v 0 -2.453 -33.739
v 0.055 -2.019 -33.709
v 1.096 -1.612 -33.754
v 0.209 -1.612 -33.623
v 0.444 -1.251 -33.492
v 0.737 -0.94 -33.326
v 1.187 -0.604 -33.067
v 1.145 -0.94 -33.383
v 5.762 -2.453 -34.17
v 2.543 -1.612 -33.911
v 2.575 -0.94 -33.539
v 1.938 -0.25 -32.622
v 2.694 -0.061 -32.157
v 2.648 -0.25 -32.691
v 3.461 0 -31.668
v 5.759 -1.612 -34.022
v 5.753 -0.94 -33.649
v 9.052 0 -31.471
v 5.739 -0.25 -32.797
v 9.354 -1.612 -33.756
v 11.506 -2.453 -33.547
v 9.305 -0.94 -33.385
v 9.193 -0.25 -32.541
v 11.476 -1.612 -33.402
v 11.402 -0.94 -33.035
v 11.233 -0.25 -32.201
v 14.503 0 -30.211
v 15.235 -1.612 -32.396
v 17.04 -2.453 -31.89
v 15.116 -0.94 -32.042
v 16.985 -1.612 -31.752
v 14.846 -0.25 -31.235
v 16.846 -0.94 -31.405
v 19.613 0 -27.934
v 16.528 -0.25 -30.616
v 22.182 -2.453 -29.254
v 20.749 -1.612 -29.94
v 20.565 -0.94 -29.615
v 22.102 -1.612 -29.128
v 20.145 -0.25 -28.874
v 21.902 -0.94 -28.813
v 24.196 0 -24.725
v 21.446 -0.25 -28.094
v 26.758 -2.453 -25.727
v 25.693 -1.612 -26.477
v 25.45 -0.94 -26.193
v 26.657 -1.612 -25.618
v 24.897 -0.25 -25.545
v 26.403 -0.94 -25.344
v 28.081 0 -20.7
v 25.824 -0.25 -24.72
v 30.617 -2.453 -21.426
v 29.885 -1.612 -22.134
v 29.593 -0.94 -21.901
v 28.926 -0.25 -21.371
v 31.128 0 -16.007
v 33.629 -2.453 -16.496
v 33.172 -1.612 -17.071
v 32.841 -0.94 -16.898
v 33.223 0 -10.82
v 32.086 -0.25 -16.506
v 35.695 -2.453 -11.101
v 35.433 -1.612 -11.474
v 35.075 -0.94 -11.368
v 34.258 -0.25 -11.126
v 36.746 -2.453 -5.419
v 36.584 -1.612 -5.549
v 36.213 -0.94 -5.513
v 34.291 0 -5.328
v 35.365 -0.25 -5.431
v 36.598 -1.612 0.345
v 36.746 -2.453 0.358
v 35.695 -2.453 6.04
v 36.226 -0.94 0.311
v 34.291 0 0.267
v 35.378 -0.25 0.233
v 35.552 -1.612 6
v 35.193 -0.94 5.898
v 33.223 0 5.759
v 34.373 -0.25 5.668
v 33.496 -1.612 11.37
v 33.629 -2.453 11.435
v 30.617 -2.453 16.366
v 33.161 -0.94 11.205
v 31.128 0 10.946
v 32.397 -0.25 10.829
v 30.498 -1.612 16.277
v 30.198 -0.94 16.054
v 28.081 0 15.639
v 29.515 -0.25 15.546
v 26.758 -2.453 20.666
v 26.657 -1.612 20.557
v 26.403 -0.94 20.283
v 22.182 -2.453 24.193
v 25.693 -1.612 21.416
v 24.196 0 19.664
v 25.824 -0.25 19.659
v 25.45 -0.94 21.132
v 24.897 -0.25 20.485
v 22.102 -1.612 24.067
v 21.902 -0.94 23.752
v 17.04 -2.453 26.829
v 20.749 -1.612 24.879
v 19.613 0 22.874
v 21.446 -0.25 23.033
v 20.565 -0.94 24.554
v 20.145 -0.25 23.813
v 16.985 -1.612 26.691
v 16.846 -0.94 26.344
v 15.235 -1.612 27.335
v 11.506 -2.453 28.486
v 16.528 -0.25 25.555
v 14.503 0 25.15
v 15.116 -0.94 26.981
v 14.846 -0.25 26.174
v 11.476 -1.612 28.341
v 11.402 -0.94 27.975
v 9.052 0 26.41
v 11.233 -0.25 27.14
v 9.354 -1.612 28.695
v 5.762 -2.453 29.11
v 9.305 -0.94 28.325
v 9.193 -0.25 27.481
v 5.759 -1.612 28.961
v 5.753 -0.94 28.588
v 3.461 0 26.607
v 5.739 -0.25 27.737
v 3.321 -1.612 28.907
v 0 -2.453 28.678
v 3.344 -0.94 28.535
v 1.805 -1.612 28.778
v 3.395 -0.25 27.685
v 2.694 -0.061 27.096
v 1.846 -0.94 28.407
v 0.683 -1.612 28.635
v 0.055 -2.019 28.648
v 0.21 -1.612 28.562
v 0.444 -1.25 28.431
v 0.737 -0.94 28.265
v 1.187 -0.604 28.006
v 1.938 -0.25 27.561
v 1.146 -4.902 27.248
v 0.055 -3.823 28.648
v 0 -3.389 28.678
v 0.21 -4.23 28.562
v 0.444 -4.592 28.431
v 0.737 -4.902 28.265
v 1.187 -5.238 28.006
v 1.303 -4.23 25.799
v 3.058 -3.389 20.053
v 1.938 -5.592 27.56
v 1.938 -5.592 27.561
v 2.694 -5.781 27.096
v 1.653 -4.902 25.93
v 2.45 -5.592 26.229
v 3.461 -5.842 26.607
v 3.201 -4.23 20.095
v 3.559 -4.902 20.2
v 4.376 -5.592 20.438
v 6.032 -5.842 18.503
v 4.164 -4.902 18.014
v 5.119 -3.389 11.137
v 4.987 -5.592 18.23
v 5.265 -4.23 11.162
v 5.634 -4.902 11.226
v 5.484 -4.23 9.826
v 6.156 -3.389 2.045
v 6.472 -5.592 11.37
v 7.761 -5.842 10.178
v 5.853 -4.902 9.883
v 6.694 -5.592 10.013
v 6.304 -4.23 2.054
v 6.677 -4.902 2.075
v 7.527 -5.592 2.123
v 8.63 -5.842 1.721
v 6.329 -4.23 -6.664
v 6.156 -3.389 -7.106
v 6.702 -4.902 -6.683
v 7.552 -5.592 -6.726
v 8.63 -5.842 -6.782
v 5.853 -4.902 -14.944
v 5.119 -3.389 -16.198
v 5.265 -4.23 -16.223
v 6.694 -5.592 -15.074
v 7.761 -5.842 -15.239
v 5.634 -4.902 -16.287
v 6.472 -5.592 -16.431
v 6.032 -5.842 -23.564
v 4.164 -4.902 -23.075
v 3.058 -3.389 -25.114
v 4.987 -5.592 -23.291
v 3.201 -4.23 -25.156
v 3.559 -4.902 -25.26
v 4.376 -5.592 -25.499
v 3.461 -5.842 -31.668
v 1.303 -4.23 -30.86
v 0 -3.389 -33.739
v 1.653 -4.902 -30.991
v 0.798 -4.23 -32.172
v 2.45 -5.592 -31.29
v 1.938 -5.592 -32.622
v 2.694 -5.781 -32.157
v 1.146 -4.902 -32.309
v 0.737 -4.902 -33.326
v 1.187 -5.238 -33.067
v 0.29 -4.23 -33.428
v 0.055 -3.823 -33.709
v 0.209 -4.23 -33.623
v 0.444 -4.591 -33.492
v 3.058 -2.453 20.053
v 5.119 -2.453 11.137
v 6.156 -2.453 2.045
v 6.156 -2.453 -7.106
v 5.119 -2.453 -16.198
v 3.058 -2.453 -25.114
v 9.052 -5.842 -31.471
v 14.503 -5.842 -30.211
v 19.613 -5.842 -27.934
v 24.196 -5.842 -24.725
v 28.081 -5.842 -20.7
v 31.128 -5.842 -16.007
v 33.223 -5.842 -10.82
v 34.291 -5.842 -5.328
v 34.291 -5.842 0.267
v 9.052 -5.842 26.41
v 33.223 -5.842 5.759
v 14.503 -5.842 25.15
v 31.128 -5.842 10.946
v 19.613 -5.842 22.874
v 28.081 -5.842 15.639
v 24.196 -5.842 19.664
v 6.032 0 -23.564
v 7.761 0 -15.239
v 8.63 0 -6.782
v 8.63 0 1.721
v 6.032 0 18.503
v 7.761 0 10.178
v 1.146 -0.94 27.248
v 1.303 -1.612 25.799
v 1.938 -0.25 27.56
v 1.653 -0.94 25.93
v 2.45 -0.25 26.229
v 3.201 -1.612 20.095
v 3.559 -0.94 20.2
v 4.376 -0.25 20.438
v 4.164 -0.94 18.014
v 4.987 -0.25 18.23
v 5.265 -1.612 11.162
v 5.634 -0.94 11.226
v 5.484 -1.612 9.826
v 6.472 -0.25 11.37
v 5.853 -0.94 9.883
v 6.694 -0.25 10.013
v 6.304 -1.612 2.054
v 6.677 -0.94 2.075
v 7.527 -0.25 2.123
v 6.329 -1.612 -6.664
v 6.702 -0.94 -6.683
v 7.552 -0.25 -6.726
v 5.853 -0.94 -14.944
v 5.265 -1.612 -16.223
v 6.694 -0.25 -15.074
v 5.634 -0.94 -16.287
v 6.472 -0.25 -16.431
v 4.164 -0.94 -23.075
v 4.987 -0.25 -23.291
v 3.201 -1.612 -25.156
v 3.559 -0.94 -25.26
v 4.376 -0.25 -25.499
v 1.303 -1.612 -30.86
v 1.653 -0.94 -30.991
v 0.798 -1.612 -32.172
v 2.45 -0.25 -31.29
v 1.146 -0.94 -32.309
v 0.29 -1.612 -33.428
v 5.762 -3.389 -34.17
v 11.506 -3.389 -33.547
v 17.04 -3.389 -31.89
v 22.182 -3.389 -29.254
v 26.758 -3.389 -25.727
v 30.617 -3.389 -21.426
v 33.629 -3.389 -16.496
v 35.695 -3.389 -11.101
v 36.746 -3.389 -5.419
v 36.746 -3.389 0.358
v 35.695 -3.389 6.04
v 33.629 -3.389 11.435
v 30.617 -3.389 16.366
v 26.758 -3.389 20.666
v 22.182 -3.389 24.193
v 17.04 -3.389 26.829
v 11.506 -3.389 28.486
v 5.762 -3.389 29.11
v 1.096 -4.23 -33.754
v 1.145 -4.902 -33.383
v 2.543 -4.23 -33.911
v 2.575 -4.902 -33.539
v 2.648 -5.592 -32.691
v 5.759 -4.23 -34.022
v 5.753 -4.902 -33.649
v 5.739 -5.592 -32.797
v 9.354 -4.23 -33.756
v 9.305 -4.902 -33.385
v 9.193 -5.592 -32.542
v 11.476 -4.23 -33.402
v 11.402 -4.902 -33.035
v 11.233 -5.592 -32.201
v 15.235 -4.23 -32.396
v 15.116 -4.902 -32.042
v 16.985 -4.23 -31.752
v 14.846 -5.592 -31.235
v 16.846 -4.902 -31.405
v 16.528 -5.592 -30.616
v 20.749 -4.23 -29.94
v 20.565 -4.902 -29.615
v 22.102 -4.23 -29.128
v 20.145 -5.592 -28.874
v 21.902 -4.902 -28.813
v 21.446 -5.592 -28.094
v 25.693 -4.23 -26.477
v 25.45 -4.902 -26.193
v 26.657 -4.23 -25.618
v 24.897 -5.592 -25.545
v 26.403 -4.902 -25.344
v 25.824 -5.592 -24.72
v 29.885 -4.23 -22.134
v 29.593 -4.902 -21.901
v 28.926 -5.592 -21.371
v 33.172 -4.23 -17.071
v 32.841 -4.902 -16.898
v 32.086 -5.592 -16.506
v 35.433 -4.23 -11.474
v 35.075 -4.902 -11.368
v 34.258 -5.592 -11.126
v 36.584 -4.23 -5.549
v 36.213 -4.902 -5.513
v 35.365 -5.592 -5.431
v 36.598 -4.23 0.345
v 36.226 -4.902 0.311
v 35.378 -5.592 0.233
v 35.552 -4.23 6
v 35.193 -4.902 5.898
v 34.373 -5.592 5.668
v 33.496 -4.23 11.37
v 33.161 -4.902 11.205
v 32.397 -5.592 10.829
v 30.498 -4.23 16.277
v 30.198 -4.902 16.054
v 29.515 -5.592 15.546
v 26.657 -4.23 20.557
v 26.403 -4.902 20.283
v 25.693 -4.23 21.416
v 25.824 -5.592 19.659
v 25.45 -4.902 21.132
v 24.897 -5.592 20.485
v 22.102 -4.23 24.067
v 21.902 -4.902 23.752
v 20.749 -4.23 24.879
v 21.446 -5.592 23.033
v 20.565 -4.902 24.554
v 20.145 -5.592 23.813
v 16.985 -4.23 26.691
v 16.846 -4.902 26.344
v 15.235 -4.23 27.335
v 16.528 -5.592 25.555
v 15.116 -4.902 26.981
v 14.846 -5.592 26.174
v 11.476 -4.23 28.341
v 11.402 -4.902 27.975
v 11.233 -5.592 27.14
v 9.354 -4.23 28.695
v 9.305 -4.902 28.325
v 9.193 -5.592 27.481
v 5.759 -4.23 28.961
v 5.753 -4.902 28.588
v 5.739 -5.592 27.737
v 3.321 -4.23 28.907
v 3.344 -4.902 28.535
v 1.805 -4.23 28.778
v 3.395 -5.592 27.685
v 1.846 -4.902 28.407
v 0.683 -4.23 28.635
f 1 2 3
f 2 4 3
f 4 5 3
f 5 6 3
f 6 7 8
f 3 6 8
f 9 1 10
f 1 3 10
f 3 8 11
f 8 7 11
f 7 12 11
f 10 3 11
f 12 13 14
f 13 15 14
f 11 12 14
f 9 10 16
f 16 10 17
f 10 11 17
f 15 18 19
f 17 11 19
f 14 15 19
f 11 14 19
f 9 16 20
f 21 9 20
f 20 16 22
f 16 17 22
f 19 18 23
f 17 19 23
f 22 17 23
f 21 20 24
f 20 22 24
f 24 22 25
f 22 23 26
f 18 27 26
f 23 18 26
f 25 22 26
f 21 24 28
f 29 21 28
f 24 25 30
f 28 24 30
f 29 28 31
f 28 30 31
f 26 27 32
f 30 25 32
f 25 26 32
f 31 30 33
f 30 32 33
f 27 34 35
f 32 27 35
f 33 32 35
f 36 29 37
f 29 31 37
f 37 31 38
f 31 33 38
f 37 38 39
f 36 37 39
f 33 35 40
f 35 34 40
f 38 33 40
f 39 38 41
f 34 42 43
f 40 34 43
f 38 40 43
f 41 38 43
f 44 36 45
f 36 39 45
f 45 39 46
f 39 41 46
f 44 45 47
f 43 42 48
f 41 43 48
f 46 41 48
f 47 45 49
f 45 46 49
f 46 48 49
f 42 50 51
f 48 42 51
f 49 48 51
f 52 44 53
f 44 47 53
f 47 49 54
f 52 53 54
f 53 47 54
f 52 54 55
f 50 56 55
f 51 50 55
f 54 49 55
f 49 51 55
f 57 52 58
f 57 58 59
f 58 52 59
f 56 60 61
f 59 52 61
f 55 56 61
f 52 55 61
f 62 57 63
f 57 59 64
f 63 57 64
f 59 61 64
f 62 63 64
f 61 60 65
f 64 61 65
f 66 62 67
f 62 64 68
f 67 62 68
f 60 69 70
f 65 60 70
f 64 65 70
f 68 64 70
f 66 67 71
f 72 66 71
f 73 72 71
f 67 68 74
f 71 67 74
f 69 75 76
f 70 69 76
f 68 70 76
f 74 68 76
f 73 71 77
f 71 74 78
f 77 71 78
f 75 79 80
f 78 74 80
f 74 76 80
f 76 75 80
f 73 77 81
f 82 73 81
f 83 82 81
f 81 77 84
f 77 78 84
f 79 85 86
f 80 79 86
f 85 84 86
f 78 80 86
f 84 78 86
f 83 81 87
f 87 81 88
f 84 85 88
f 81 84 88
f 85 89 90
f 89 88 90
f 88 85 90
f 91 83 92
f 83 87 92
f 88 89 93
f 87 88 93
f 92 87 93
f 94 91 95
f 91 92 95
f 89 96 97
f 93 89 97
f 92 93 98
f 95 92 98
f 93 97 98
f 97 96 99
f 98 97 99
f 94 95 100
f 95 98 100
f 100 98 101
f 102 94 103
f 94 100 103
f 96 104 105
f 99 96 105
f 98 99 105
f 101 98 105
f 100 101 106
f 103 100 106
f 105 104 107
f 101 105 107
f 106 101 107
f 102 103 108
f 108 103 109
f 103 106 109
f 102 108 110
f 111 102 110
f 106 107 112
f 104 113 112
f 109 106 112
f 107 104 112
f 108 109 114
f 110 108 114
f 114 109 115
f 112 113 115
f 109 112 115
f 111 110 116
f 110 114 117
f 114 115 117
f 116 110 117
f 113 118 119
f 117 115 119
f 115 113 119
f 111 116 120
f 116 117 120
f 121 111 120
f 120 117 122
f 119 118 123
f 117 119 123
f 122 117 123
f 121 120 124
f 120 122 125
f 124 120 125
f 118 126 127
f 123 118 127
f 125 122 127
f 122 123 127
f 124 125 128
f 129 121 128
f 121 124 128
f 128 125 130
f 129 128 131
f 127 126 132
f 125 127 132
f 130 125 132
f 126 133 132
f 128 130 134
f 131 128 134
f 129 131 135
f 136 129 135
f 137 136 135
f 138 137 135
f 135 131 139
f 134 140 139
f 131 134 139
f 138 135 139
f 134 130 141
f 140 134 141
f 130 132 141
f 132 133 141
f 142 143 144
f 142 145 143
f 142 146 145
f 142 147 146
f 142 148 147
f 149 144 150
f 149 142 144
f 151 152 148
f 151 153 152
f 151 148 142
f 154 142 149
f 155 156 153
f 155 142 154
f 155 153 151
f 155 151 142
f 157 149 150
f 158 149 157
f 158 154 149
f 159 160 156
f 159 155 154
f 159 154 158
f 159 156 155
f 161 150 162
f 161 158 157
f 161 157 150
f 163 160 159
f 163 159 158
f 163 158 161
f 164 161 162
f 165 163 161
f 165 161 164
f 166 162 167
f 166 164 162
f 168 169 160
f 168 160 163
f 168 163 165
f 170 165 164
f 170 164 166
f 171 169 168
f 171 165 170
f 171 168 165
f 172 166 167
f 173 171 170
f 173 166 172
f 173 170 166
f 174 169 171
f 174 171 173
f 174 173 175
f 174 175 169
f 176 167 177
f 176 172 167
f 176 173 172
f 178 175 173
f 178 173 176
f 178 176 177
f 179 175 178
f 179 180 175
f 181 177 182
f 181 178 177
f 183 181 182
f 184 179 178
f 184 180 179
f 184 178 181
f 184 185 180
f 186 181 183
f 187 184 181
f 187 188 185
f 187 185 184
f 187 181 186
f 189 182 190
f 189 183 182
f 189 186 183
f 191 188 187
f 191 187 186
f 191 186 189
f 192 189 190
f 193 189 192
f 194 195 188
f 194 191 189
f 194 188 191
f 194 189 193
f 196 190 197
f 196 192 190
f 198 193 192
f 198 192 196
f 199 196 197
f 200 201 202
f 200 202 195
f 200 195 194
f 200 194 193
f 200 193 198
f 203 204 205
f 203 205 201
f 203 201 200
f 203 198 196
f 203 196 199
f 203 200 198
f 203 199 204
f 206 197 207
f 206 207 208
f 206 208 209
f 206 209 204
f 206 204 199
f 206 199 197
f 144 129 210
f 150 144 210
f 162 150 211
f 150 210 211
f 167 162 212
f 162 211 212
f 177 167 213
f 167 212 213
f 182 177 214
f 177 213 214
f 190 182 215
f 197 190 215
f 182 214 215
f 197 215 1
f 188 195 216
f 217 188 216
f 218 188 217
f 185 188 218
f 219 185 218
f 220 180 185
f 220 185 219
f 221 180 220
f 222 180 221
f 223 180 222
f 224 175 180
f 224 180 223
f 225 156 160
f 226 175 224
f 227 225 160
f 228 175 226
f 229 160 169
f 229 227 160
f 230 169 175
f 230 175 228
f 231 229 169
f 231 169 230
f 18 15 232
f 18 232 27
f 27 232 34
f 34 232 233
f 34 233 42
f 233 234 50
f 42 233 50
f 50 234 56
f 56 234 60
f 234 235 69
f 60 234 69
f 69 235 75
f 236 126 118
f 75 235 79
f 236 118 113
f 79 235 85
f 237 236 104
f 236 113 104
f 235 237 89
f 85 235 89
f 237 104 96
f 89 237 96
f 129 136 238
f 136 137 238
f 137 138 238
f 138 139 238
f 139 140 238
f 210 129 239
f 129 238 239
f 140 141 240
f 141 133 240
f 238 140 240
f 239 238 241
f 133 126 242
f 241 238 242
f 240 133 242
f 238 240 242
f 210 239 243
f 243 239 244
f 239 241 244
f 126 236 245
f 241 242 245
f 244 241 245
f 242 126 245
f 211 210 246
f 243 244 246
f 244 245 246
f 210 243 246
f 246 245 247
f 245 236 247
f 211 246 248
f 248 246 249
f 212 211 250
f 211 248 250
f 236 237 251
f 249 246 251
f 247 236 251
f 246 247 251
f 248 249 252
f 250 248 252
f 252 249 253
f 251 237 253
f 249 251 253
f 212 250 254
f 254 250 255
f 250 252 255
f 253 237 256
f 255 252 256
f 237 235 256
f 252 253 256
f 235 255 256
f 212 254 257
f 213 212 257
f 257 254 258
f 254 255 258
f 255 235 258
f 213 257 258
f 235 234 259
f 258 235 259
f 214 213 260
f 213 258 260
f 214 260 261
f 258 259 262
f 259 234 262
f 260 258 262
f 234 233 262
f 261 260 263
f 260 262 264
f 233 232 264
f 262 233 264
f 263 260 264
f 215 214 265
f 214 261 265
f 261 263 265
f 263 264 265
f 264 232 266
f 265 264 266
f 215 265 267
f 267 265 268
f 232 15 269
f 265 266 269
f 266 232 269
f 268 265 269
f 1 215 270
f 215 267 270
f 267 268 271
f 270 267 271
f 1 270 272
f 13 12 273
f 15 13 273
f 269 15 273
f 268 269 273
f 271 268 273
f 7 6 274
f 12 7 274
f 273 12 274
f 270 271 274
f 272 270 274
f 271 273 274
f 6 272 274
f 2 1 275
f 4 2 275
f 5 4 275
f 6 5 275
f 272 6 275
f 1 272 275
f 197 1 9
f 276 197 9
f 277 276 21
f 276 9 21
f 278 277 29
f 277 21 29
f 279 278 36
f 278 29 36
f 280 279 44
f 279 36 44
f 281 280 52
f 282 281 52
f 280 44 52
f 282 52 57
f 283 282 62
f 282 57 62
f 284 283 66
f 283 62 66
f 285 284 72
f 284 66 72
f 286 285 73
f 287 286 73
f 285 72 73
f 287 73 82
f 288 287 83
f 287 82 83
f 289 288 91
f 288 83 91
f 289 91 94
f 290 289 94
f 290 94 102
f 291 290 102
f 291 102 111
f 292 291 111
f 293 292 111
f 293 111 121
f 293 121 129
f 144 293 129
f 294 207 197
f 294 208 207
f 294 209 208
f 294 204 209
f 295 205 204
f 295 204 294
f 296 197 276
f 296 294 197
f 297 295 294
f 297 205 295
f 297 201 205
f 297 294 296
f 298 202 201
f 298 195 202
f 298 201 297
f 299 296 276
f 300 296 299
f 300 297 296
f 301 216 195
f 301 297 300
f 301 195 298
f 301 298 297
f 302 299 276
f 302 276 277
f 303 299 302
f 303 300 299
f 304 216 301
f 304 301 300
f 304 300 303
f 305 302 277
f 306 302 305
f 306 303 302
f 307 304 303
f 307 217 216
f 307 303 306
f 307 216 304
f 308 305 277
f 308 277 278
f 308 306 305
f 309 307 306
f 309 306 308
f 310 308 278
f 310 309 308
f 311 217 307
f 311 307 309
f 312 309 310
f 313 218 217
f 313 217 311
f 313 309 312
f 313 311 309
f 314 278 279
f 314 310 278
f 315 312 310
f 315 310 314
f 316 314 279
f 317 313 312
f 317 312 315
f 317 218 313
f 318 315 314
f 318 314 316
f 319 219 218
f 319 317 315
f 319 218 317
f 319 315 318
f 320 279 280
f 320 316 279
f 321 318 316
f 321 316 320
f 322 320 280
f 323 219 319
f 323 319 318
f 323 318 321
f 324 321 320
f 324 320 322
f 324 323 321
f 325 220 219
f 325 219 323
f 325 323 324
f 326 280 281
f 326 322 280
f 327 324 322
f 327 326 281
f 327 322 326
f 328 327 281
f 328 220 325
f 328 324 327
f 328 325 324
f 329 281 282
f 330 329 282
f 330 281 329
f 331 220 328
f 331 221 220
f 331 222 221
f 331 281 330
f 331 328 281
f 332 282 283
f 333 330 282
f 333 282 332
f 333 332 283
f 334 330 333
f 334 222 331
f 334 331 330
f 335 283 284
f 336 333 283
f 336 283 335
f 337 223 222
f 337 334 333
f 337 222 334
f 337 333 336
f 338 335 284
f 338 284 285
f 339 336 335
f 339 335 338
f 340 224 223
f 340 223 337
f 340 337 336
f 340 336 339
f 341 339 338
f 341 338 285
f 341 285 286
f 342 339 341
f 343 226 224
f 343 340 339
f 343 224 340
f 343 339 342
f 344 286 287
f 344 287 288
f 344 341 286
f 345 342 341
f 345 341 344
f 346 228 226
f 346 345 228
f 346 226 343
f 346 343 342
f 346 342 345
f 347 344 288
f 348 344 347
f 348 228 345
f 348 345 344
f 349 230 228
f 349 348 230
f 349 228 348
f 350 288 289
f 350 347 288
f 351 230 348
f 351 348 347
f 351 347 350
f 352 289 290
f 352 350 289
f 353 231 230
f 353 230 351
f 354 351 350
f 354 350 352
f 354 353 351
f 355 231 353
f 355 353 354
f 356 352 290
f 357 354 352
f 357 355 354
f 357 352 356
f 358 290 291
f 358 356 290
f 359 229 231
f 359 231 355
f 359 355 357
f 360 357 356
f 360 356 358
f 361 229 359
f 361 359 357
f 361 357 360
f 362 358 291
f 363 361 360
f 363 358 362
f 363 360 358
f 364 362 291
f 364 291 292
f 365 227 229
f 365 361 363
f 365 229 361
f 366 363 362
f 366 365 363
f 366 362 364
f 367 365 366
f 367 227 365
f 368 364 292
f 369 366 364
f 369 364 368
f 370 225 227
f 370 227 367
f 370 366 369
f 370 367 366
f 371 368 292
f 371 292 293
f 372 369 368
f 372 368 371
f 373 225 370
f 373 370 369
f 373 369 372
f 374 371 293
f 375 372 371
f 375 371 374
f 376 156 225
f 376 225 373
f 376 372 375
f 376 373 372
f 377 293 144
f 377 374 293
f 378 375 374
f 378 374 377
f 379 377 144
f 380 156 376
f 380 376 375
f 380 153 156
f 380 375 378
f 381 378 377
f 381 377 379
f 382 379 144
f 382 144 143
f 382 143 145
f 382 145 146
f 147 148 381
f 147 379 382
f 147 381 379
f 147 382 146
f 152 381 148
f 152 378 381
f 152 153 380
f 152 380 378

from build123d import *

# Parameters (mm, degrees)
F1_DEPTH = 5.842
F2_R     = 2.452841


with BuildPart() as f1:
    # F0 (on Front) → F1 (new body)
    with BuildSketch(Plane.XZ):
        with BuildLine():
            ThreePointArc((0, 28.678283), (6.286108, -2.530437), (0, -33.739157))
            ThreePointArc((0, -33.739157), (36.877814, -2.530437), (0, 28.678283))
        make_face()
    extrude(amount=F1_DEPTH)

    # F2
    f2_edges = [f1.edges().sort_by_distance(p)[0] for p in [
        (6.286108, -5.842, -2.530437),
        (36.877814, -5.842, -2.530437),
        (36.877814, 0, -2.530437),
        (6.286108, 0, -2.530437),
    ]]
    fillet(f2_edges, radius=F2_R)


solid = f1.part
